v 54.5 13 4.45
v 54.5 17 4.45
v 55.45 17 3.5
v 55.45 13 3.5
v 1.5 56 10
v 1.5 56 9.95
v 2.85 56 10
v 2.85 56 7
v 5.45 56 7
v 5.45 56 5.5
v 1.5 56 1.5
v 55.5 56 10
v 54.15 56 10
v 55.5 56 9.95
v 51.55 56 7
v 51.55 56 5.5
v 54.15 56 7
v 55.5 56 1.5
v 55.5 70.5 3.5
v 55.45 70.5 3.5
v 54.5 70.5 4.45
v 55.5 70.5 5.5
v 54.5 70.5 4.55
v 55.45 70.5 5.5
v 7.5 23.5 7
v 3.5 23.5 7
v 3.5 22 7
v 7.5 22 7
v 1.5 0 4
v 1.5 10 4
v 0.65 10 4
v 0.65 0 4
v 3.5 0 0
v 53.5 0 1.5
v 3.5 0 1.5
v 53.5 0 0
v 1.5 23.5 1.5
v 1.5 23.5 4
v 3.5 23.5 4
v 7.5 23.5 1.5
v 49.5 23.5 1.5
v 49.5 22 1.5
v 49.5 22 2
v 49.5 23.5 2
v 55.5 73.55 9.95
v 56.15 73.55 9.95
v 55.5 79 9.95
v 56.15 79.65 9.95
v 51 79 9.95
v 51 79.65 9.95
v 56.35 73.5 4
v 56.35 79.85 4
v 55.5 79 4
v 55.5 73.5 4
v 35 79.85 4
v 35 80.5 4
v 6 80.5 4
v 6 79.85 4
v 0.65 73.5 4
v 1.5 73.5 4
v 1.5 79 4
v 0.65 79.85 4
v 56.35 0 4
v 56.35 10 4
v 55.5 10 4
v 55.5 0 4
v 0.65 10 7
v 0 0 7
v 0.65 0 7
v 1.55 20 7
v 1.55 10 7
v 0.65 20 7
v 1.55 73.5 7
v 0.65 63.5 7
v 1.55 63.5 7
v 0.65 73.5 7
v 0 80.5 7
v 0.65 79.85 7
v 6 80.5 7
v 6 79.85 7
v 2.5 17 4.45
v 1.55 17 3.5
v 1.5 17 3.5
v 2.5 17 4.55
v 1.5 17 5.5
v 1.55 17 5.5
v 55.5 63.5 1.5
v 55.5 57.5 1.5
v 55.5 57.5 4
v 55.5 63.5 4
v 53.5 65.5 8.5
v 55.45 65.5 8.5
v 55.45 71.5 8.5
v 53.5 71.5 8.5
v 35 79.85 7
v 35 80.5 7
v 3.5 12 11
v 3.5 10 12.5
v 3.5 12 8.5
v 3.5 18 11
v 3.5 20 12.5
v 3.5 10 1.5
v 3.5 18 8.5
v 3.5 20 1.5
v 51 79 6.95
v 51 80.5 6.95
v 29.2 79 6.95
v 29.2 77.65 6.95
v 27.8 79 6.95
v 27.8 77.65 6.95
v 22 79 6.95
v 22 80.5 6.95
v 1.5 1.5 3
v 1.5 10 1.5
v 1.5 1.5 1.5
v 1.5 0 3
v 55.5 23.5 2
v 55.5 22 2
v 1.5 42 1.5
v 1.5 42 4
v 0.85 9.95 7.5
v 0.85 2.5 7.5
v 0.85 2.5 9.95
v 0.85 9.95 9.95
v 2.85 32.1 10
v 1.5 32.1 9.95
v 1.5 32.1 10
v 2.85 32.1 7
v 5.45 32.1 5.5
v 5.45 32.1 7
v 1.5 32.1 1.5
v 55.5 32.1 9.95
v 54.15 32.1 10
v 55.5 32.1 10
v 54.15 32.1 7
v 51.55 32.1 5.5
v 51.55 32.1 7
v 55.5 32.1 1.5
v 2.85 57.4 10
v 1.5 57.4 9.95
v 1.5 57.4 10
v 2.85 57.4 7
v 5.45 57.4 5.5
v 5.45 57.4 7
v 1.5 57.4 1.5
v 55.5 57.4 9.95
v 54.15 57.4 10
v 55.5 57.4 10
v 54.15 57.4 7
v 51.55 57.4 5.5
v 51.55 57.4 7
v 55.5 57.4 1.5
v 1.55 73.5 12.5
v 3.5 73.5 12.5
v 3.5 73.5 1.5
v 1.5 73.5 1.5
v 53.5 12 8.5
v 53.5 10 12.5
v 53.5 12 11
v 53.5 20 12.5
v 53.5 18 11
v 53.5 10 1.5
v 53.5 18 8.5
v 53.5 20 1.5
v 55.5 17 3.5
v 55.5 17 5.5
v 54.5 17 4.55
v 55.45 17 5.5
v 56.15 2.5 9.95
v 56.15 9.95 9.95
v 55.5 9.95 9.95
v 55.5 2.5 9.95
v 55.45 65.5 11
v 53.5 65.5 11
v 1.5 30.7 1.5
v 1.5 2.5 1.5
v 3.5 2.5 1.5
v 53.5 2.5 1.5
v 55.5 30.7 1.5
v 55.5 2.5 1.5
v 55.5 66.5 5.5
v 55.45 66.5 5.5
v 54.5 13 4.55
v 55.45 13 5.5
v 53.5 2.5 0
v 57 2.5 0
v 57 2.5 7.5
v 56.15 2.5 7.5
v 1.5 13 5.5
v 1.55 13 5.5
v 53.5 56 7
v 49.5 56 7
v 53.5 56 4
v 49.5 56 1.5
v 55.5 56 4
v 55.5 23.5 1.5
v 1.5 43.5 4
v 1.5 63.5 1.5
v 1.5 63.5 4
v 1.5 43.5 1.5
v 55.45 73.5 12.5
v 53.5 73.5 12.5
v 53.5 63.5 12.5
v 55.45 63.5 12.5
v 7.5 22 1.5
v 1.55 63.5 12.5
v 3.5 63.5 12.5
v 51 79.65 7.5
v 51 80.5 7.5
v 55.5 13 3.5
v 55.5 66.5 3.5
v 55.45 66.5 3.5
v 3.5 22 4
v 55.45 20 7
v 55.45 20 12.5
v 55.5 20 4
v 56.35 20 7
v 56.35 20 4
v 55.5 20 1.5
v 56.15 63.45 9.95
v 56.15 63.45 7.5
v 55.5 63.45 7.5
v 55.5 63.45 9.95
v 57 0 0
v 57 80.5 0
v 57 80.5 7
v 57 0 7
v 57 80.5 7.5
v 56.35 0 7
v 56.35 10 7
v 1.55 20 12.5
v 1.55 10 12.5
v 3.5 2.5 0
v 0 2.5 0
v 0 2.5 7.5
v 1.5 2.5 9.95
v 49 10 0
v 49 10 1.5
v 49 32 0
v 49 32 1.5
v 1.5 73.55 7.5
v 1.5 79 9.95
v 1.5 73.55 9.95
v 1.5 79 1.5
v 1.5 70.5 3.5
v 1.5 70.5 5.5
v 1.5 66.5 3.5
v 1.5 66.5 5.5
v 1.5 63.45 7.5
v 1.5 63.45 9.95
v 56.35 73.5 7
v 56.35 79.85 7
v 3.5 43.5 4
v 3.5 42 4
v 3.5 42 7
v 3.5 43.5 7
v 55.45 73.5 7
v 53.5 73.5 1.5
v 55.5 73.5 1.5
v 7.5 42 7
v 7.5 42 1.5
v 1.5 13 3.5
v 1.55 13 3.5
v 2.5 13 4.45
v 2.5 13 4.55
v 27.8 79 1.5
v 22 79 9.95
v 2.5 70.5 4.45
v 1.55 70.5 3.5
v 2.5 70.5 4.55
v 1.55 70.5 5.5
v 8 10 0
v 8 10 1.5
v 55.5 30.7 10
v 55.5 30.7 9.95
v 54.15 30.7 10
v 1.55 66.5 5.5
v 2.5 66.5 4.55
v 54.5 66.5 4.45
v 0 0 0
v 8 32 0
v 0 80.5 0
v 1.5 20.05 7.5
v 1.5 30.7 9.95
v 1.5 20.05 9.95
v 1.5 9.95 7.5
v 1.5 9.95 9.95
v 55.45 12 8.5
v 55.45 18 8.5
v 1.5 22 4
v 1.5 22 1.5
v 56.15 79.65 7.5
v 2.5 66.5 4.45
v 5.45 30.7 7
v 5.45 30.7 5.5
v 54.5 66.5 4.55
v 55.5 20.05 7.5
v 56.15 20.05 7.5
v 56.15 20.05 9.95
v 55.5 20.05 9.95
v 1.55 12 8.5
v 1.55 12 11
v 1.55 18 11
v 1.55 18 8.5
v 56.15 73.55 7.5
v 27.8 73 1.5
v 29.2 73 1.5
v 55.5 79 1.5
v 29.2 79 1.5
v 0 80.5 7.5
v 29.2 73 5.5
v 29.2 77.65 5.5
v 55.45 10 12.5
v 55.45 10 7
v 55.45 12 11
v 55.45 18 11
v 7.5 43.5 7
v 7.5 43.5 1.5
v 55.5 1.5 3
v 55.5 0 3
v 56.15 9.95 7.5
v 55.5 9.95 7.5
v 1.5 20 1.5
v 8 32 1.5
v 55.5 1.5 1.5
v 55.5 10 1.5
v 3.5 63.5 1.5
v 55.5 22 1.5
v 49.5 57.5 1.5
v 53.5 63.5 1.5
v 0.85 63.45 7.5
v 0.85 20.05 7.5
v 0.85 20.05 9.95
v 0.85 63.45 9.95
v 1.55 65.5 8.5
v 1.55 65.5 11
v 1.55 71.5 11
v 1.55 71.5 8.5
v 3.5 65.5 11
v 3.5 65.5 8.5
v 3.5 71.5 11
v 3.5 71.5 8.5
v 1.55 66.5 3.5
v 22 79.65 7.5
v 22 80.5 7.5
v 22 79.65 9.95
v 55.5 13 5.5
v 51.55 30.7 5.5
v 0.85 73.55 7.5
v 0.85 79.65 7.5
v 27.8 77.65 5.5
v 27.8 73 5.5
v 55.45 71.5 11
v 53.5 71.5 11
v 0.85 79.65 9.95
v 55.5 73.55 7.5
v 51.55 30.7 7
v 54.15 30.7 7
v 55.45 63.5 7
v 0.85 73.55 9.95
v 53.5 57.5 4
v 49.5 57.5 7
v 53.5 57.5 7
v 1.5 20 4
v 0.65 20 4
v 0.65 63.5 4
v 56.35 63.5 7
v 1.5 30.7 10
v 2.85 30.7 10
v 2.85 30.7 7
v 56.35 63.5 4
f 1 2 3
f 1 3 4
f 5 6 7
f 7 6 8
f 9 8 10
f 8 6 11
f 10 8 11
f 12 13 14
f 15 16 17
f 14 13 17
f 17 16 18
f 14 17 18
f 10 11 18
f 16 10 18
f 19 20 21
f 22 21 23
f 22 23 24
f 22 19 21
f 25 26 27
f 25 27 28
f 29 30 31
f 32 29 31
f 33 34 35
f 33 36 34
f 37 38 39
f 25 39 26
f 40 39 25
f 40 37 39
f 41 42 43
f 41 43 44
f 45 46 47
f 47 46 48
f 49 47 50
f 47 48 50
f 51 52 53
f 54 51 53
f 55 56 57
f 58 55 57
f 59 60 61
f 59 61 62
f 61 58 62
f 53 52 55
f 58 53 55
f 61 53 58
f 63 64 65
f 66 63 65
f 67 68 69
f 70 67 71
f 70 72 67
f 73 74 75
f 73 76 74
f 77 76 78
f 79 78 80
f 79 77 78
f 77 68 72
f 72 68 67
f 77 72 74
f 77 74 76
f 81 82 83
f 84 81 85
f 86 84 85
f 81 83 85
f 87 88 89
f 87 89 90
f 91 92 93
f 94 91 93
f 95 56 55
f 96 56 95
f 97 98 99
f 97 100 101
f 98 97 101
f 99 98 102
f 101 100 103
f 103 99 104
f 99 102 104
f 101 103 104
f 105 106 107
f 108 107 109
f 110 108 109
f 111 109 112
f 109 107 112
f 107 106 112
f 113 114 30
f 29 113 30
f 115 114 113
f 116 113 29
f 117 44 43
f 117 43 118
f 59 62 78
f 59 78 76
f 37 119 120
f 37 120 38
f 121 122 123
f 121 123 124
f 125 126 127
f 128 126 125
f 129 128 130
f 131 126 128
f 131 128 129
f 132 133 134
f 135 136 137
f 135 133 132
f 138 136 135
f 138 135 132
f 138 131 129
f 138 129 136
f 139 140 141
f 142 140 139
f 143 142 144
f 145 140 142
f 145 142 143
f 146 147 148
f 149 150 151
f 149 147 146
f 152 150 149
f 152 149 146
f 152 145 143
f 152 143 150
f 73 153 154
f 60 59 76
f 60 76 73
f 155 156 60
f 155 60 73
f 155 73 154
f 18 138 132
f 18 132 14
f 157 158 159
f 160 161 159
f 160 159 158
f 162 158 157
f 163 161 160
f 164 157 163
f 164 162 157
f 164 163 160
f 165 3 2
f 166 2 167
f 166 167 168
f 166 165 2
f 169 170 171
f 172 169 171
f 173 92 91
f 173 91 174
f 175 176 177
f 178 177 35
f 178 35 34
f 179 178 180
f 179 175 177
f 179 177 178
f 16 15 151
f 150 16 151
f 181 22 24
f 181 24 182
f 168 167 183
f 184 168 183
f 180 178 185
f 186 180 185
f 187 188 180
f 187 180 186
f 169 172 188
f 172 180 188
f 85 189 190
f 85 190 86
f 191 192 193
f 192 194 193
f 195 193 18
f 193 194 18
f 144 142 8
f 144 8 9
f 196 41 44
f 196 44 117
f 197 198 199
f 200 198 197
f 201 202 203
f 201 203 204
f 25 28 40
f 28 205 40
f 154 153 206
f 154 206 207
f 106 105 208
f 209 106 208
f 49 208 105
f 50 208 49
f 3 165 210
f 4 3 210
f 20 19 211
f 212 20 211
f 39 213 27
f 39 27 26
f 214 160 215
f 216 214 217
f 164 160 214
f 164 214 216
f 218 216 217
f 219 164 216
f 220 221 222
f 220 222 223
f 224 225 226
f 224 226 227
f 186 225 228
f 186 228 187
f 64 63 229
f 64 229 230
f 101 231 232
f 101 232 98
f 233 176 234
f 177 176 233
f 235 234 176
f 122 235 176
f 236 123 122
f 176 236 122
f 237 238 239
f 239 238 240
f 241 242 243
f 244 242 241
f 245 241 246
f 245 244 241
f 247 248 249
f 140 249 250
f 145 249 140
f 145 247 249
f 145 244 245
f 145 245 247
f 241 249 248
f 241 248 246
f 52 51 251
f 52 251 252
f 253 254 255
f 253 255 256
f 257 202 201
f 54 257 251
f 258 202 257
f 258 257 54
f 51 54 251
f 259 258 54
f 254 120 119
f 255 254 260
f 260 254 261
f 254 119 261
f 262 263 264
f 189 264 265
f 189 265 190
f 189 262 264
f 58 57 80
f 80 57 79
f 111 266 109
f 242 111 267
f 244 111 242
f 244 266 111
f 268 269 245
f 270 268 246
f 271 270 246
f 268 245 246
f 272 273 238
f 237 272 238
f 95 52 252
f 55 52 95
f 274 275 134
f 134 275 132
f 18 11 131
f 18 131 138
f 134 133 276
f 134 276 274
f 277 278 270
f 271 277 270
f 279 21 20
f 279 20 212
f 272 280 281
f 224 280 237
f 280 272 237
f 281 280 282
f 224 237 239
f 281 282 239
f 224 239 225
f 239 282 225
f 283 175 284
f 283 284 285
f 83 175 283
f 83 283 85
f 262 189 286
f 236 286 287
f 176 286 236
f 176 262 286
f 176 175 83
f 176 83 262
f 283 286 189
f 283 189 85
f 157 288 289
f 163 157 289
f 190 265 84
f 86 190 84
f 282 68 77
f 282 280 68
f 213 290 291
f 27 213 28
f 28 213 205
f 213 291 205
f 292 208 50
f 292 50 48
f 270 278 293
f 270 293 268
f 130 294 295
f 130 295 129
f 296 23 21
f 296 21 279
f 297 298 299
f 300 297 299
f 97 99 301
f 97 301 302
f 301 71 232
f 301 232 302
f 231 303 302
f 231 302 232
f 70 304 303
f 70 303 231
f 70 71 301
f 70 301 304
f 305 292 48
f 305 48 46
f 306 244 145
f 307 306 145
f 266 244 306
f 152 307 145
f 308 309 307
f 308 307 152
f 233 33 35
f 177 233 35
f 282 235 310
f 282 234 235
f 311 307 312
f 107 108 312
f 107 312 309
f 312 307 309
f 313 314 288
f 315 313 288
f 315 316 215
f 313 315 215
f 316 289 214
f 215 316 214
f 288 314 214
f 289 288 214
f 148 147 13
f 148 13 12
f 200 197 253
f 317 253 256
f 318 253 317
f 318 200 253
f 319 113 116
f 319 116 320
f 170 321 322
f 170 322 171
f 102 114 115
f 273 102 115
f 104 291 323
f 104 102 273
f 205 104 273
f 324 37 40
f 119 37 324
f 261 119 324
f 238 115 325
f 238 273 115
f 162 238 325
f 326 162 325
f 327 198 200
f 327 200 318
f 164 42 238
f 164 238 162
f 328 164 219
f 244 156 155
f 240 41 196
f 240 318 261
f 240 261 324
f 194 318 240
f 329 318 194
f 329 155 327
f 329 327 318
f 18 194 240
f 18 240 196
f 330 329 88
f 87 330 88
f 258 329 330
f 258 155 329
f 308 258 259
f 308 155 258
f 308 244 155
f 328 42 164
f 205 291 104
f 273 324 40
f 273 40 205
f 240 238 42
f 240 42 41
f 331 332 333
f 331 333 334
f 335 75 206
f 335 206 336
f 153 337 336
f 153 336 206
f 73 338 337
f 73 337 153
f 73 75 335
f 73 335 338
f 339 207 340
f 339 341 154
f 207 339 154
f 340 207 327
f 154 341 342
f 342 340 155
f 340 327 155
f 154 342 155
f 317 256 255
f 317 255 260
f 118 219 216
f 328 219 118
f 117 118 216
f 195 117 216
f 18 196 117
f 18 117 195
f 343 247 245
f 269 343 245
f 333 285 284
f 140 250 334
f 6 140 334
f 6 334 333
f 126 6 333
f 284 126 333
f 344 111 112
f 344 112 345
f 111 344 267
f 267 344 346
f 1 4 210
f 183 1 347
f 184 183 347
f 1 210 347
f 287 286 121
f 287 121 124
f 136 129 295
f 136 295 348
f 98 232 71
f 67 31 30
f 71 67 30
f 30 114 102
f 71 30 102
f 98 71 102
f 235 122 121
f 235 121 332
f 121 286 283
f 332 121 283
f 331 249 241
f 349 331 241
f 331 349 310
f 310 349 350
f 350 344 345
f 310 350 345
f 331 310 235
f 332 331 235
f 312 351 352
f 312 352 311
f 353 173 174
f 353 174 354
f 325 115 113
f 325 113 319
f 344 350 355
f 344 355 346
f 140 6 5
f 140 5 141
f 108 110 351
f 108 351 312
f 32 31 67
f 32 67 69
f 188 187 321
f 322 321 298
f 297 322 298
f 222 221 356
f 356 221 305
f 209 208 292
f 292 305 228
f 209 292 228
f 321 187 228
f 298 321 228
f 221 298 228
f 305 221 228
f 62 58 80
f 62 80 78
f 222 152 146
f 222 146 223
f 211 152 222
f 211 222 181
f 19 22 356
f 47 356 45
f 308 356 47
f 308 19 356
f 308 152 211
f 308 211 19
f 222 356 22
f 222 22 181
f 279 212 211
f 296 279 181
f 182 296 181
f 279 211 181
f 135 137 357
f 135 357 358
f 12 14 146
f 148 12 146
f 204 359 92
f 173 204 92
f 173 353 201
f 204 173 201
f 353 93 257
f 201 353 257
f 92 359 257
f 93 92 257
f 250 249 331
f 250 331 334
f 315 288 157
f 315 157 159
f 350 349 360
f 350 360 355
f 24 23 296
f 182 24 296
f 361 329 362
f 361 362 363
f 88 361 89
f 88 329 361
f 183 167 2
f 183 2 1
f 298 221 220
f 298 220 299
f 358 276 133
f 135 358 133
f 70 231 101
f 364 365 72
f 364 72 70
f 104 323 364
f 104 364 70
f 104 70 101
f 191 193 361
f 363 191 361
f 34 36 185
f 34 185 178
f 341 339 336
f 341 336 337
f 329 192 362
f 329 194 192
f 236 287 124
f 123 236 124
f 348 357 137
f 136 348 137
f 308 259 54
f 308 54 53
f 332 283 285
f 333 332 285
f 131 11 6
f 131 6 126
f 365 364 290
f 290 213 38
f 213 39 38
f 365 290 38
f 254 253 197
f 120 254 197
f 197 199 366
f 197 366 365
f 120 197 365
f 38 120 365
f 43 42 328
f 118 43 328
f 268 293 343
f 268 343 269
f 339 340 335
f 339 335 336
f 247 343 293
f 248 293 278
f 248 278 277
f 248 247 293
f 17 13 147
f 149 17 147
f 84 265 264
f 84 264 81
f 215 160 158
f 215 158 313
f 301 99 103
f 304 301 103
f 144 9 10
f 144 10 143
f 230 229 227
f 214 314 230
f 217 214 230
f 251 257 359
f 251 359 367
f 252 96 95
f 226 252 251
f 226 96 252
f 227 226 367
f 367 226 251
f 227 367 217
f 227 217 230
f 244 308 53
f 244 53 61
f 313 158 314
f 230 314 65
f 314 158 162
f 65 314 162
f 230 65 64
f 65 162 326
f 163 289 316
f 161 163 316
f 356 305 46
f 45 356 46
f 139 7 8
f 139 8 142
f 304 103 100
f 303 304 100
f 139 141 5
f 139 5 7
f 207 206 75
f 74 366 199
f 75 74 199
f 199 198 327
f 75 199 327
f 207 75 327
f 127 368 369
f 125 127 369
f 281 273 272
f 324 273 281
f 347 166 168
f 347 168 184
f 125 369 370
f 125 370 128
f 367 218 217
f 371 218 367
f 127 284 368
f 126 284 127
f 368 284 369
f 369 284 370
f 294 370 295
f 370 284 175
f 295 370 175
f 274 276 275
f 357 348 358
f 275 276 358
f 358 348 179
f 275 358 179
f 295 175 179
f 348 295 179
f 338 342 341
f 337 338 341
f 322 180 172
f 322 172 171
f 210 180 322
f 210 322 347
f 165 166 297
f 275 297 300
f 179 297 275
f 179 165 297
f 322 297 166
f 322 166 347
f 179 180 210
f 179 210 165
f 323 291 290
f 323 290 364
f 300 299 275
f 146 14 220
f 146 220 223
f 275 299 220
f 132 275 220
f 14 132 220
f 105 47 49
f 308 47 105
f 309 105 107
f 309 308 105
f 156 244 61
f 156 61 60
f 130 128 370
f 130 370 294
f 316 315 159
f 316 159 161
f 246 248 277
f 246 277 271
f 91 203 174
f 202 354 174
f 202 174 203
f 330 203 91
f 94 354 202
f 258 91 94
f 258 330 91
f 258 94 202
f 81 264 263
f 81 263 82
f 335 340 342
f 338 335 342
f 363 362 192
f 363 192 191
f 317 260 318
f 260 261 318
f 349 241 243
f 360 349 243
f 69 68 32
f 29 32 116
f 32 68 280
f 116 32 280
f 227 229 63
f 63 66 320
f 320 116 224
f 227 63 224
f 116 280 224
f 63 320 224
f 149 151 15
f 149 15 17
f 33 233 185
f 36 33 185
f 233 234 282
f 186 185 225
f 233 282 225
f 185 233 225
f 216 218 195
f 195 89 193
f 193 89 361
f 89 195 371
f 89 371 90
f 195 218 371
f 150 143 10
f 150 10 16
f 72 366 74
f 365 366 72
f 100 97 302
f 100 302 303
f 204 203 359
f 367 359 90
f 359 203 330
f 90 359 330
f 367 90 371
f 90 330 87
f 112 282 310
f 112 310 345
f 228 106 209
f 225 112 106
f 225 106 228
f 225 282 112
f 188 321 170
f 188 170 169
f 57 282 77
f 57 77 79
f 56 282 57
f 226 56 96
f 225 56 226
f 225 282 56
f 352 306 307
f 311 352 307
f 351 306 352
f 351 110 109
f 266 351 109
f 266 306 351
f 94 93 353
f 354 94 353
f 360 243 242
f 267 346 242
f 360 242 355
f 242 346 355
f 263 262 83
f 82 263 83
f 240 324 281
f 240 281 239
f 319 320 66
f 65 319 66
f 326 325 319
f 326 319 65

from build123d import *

# Parameters (mm, degrees)
SKETCH_W        = 57
SKETCH_H        = 80.5
PAD_DEPTH       = 1.5
PAD001_DEPTH    = 6
PAD002_DEPTH    = 2.45
SKETCH003_W     = 54
SKETCH003_H     = 1.4
SKETCH003_W_2   = 1.4
SKETCH003_H_2   = 6
PAD003_DEPTH    = 8.5
SKETCH004_W     = 51.3
SKETCH004_H     = 77.65
POCKET_DEPTH    = 3
SKETCH005_W     = 46.1
SKETCH005_H     = 77.65
POCKET001_DEPTH = 1.5
SKETCH027_W     = 10.1
SKETCH027_H     = 2.45
POCKET003_DEPTH = 56.151
SKETCH028_W     = 4
SKETCH028_H     = 2
PAD024_DEPTH    = 1
SKETCH029_W     = 4
SKETCH029_H     = 2
PAD025_DEPTH    = 1
CHAMFER_SIZE    = 0.95
SKETCH030_W     = 3.5
SKETCH030_H     = 9.95
POCKET004_DEPTH = 2.5
SKETCH034_W     = 29
SKETCH034_H     = 3.5
POCKET008_DEPTH = 3
SKETCH006_W     = 57
SKETCH006_H     = 80.5
PAD004_DEPTH    = 1.5
PAD005_DEPTH    = 2.5
PAD006_DEPTH    = 3
SKETCH009_W     = 54
SKETCH009_H     = 1.5
PAD007_DEPTH    = 1.5
SKETCH010_W     = 6
SKETCH010_H     = 1.5
PAD008_DEPTH    = 2.5
SKETCH011_W     = 6
SKETCH011_H     = 1.5
PAD009_DEPTH    = 2.5
SKETCH012_W     = 6
SKETCH012_H     = 1.5
PAD010_DEPTH    = 2.5
SKETCH013_W     = 4
SKETCH013_H     = 1.5
PAD011_DEPTH    = 3
SKETCH014_W     = 4
SKETCH014_H     = 1.5
PAD012_DEPTH    = 3
SKETCH015_W     = 4
SKETCH015_H     = 1.5
PAD013_DEPTH    = 3
SKETCH016_W     = 4
SKETCH016_H     = 1.5
PAD014_DEPTH    = 3
SKETCH017_W     = 2
SKETCH017_H     = 10
PAD015_DEPTH    = 2.5
SKETCH018_W     = 2.85
SKETCH018_H     = 10
PAD016_DEPTH    = 3
SKETCH019_W     = 2.85
SKETCH019_H     = 10
PAD017_DEPTH    = 3
SKETCH020_W     = 2.85
SKETCH020_H     = 10
PAD018_DEPTH    = 3
SKETCH021_W     = 2.85
SKETCH021_H     = 10
PAD019_DEPTH    = 3
SKETCH022_W     = 1.95
SKETCH022_H     = 10
PAD020_DEPTH    = 5.5
SKETCH023_W     = 1.95
SKETCH023_H     = 10
PAD021_DEPTH    = 5.5
SKETCH024_W     = 1.95
SKETCH024_H     = 10
PAD022_DEPTH    = 5.5
SKETCH025_W     = 1.95
SKETCH025_H     = 10
PAD023_DEPTH    = 5.5
SKETCH026_W     = 6
SKETCH026_H     = 2.5
POCKET002_DEPTH = 55.451
SKETCH031_W     = 6
SKETCH031_H     = 1.5
POCKET005_DEPTH = 5
SKETCH032_W     = 41
SKETCH032_H     = 22
POCKET006_DEPTH = 1.5
SKETCH033_W     = 29
SKETCH033_H     = 3
POCKET007_DEPTH = 0.65


with BuildPart() as bottom:
    # Sketch → Pad (new body)
    with BuildSketch(Plane.XY):
        with Locations((28.5, 40.25)):
            Rectangle(SKETCH_W, SKETCH_H)
    extrude(amount=PAD_DEPTH)

    # Sketch001 (on Face6 of Pad) → Pad001 (join)
    with BuildSketch(Plane.XY.offset(1.5)):
        Polygon((0, 0), (0, 80.5), (57, 80.5), (57, 0), (55.5, 0), (55.5, 79), (1.5, 79), (1.5, 0), align=None)
    extrude(amount=PAD001_DEPTH)

    # Sketch002 (on Face12 of Pad001) → Pad002 (join)
    with BuildSketch(Plane.XY.offset(7.5)):
        Polygon((1.5, 0), (0.85, 0), (0.85, 79.65), (56.15, 79.65), (56.15, 0), (55.5, 0), (55.5, 79), (1.5, 79), align=None)
    extrude(amount=PAD002_DEPTH)

    # Sketch003 (on Face6 of Pad002) → Pad003 (join)
    with BuildSketch(Plane.XY.offset(1.5)):
        with Locations((28.5, 31.4)):
            Rectangle(SKETCH003_W, SKETCH003_H)
        with Locations((28.5, 56.7)):
            Rectangle(SKETCH003_W, SKETCH003_H)
        with Locations((28.5, 76)):
            Rectangle(SKETCH003_W_2, SKETCH003_H_2)
    extrude(amount=PAD003_DEPTH)

    # Sketch004 (on Face26 of Pad003) → Pocket (cut)
    with BuildSketch(Plane.XY.offset(10)):
        with Locations((28.5, 38.825)):
            Rectangle(SKETCH004_W, SKETCH004_H)
    extrude(amount=-POCKET_DEPTH, mode=Mode.SUBTRACT)

    # Sketch005 (on Face26 of Pocket) → Pocket001 (cut)
    with BuildSketch(Plane.XY.offset(7)):
        with Locations((28.5, 38.825)):
            Rectangle(SKETCH005_W, SKETCH005_H)
    extrude(amount=-POCKET001_DEPTH, mode=Mode.SUBTRACT)

    # Sketch027 (on Face19 of Pocket001) → Pocket003 (cut, through all)
    with BuildSketch(Plane.YZ.offset(56.15)):
        with Locations((15, 8.725)):
            Rectangle(SKETCH027_W, SKETCH027_H)
        with Locations((68.5, 8.725)):
            Rectangle(SKETCH027_W, SKETCH027_H)
    extrude(amount=-POCKET003_DEPTH, mode=Mode.SUBTRACT)

    # Sketch028 (on Face11 of Pocket003) → Pad024 (join)
    with BuildSketch(Plane.YZ.offset(1.5)):
        with Locations((15, 4.5)):
            Rectangle(SKETCH028_W, SKETCH028_H)
        with Locations((68.5, 4.5)):
            Rectangle(SKETCH028_W, SKETCH028_H)
    extrude(amount=PAD024_DEPTH)

    # Sketch029 (on Face15 of Pad024) → Pad025 (join)
    with BuildSketch(Plane(origin=(55.5, 0, 0), x_dir=(0, -1, 0), z_dir=(-1, 0, 0))):
        with Locations((-15, 4.5)):
            Rectangle(SKETCH029_W, SKETCH029_H)
        with Locations((-68.5, 4.5)):
            Rectangle(SKETCH029_W, SKETCH029_H)
    extrude(amount=PAD025_DEPTH)

    # Chamfer
    chamfer_edges = [bottom.edges().sort_by_distance(p)[0] for p in [
        (2.5, 15, 3.5),
        (2.5, 15, 5.5),
        (2.5, 68.5, 5.5),
        (2.5, 68.5, 3.5),
        (54.5, 68.5, 3.5),
        (54.5, 68.5, 5.5),
        (54.5, 15, 5.5),
        (54.5, 15, 3.5),
    ]]
    chamfer(chamfer_edges, length=CHAMFER_SIZE)

    # Sketch030 (on Face16 of Chamfer) → Pocket004 (cut)
    with BuildSketch(Plane.XZ):
        with Locations((1.75, 4.975)):
            Rectangle(SKETCH030_W, SKETCH030_H)
        with Locations((55.25, 4.975)):
            Rectangle(SKETCH030_W, SKETCH030_H)
    extrude(amount=-POCKET004_DEPTH, mode=Mode.SUBTRACT)

    # Sketch034 (on Face54 of Pocket004) → Pocket008 (cut)
    with BuildSketch(Plane(origin=(0, 80.5, 0), x_dir=(-1, 0, 0), z_dir=(0, 1, 0))):
        with Locations((-36.5, 8.7)):
            Rectangle(SKETCH034_W, SKETCH034_H)
    extrude(amount=-POCKET008_DEPTH, mode=Mode.SUBTRACT)


with BuildPart() as top:
    # Sketch006 → Pad004 (new body)
    with BuildSketch(Plane.XY):
        with Locations((28.5, 40.25)):
            Rectangle(SKETCH006_W, SKETCH006_H)
    extrude(amount=PAD004_DEPTH)

    # Sketch007 (on Face6 of Pad004) → Pad005 (join)
    with BuildSketch(Plane.XY.offset(1.5)):
        Polygon((0, 0), (0, 80.5), (57, 80.5), (57, 0), (55.5, 0), (55.5, 79), (1.5, 79), (1.5, 0), align=None)
    extrude(amount=PAD005_DEPTH)

    # Sketch008 (on Face12 of Pad005) → Pad006 (join)
    with BuildSketch(Plane.XY.offset(4)):
        Polygon((0, 0), (0, 80.5), (57, 80.5), (57, 0), (56.35, 0), (56.35, 79.85), (0.65, 79.85), (0.65, 0), align=None)
    extrude(amount=PAD006_DEPTH)

    # Sketch009 (on Face6 of Pad006) → Pad007 (join)
    with BuildSketch(Plane.XY.offset(1.5)):
        with Locations((28.5, 0.75)):
            Rectangle(SKETCH009_W, SKETCH009_H)
    extrude(amount=PAD007_DEPTH)

    # Sketch010 (on Face20 of Pad007) → Pad008 (join)
    with BuildSketch(Plane.XY.offset(1.5)):
        with Locations((52.5, 22.75)):
            Rectangle(SKETCH010_W, SKETCH010_H)
        with Locations((4.5, 22.75)):
            Rectangle(SKETCH010_W, SKETCH010_H)
    extrude(amount=PAD008_DEPTH)

    # Sketch011 (on Face20 of Pad008) → Pad009 (join)
    with BuildSketch(Plane.XY.offset(1.5)):
        with Locations((52.5, 56.75)):
            Rectangle(SKETCH011_W, SKETCH011_H)
    extrude(amount=PAD009_DEPTH)

    # Sketch012 (on Face20 of Pad009) → Pad010 (join)
    with BuildSketch(Plane.XY.offset(1.5)):
        with Locations((4.5, 42.75)):
            Rectangle(SKETCH012_W, SKETCH012_H)
    extrude(amount=PAD010_DEPTH)

    # Sketch013 (on Face35 of Pad010) → Pad011 (join)
    with BuildSketch(Plane.XY.offset(4)):
        with Locations((5.5, 22.75)):
            Rectangle(SKETCH013_W, SKETCH013_H)
    extrude(amount=PAD011_DEPTH)

    # Sketch014 (on Face27 of Pad011) → Pad012 (join)
    with BuildSketch(Plane.XY.offset(4)):
        with Locations((51.5, 22.75)):
            Rectangle(SKETCH014_W, SKETCH014_H)
    extrude(amount=PAD012_DEPTH)

    # Sketch015 (on Face29 of Pad012) → Pad013 (join)
    with BuildSketch(Plane.XY.offset(4)):
        with Locations((51.5, 56.75)):
            Rectangle(SKETCH015_W, SKETCH015_H)
    extrude(amount=PAD013_DEPTH)

    # Sketch016 (on Face33 of Pad013) → Pad014 (join)
    with BuildSketch(Plane.XY.offset(4)):
        with Locations((5.5, 42.75)):
            Rectangle(SKETCH016_W, SKETCH016_H)
    extrude(amount=PAD014_DEPTH)

    # Sketch017 (on Face20 of Pad014) → Pad015 (join)
    with BuildSketch(Plane.XY.offset(1.5)):
        with Locations((2.5, 15)):
            Rectangle(SKETCH017_W, SKETCH017_H)
        with Locations((54.5, 15)):
            Rectangle(SKETCH017_W, SKETCH017_H)
        with Locations((2.5, 68.5)):
            Rectangle(SKETCH017_W, SKETCH017_H)
        with Locations((54.5, 68.5)):
            Rectangle(SKETCH017_W, SKETCH017_H)
    extrude(amount=PAD015_DEPTH)

    # Sketch018 (on Face43 of Pad015) → Pad016 (join)
    with BuildSketch(Plane.XY.offset(4)):
        with Locations((2.075, 15)):
            Rectangle(SKETCH018_W, SKETCH018_H)
    extrude(amount=PAD016_DEPTH)

    # Sketch019 (on Face30 of Pad016) → Pad017 (join)
    with BuildSketch(Plane.XY.offset(4)):
        with Locations((54.925, 15)):
            Rectangle(SKETCH019_W, SKETCH019_H)
    extrude(amount=PAD017_DEPTH)

    # Sketch020 (on Face82 of Pad017) → Pad018 (join)
    with BuildSketch(Plane.XY.offset(4)):
        with Locations((2.075, 68.5)):
            Rectangle(SKETCH020_W, SKETCH020_H)
    extrude(amount=PAD018_DEPTH)

    # Sketch021 (on Face88 of Pad018) → Pad019 (join)
    with BuildSketch(Plane.XY.offset(4)):
        with Locations((54.925, 68.5)):
            Rectangle(SKETCH021_W, SKETCH021_H)
    extrude(amount=PAD019_DEPTH)

    # Sketch022 (on Face70 of Pad019) → Pad020 (join)
    with BuildSketch(Plane.XY.offset(7)):
        with Locations((2.525, 15)):
            Rectangle(SKETCH022_W, SKETCH022_H)
    extrude(amount=PAD020_DEPTH)

    # Sketch023 (on Face62 of Pad020) → Pad021 (join)
    with BuildSketch(Plane.XY.offset(7)):
        with Locations((54.475, 15)):
            Rectangle(SKETCH023_W, SKETCH023_H)
    extrude(amount=PAD021_DEPTH)

    # Sketch024 (on Face68 of Pad021) → Pad022 (join)
    with BuildSketch(Plane.XY.offset(7)):
        with Locations((2.525, 68.5)):
            Rectangle(SKETCH024_W, SKETCH024_H)
    extrude(amount=PAD022_DEPTH)

    # Sketch025 (on Face64 of Pad022) → Pad023 (join)
    with BuildSketch(Plane.XY.offset(7)):
        with Locations((54.475, 68.5)):
            Rectangle(SKETCH025_W, SKETCH025_H)
    extrude(amount=PAD023_DEPTH)

    # Sketch026 (on Face102 of Pad023) → Pocket002 (cut, through all)
    with BuildSketch(Plane.YZ.offset(55.45)):
        with Locations((15, 9.75)):
            Rectangle(SKETCH026_W, SKETCH026_H)
        with Locations((68.5, 9.75)):
            Rectangle(SKETCH026_W, SKETCH026_H)
    extrude(amount=-POCKET002_DEPTH, mode=Mode.SUBTRACT)

    # Sketch031 (on Face115 of Pocket002) → Pocket005 (cut)
    with BuildSketch(Plane.XY.offset(7)):
        with Locations((52.5, 22.75)):
            Rectangle(SKETCH031_W, SKETCH031_H)
    extrude(amount=-POCKET005_DEPTH, mode=Mode.SUBTRACT)

    # Sketch032 (on Face21 of Pocket005) → Pocket006 (cut)
    with BuildSketch(Plane.XY.offset(1.5)):
        with Locations((28.5, 21)):
            Rectangle(SKETCH032_W, SKETCH032_H)
    extrude(amount=-POCKET006_DEPTH, mode=Mode.SUBTRACT)

    # Sketch033 (on Face22 of Pocket006) → Pocket007 (cut)
    with BuildSketch(Plane(origin=(0, 80.5, 0), x_dir=(-1, 0, 0), z_dir=(0, 1, 0))):
        with Locations((-20.5, 5.5)):
            Rectangle(SKETCH033_W, SKETCH033_H)
    extrude(amount=-POCKET007_DEPTH, mode=Mode.SUBTRACT)


solid = Compound([bottom.part, top.part])
